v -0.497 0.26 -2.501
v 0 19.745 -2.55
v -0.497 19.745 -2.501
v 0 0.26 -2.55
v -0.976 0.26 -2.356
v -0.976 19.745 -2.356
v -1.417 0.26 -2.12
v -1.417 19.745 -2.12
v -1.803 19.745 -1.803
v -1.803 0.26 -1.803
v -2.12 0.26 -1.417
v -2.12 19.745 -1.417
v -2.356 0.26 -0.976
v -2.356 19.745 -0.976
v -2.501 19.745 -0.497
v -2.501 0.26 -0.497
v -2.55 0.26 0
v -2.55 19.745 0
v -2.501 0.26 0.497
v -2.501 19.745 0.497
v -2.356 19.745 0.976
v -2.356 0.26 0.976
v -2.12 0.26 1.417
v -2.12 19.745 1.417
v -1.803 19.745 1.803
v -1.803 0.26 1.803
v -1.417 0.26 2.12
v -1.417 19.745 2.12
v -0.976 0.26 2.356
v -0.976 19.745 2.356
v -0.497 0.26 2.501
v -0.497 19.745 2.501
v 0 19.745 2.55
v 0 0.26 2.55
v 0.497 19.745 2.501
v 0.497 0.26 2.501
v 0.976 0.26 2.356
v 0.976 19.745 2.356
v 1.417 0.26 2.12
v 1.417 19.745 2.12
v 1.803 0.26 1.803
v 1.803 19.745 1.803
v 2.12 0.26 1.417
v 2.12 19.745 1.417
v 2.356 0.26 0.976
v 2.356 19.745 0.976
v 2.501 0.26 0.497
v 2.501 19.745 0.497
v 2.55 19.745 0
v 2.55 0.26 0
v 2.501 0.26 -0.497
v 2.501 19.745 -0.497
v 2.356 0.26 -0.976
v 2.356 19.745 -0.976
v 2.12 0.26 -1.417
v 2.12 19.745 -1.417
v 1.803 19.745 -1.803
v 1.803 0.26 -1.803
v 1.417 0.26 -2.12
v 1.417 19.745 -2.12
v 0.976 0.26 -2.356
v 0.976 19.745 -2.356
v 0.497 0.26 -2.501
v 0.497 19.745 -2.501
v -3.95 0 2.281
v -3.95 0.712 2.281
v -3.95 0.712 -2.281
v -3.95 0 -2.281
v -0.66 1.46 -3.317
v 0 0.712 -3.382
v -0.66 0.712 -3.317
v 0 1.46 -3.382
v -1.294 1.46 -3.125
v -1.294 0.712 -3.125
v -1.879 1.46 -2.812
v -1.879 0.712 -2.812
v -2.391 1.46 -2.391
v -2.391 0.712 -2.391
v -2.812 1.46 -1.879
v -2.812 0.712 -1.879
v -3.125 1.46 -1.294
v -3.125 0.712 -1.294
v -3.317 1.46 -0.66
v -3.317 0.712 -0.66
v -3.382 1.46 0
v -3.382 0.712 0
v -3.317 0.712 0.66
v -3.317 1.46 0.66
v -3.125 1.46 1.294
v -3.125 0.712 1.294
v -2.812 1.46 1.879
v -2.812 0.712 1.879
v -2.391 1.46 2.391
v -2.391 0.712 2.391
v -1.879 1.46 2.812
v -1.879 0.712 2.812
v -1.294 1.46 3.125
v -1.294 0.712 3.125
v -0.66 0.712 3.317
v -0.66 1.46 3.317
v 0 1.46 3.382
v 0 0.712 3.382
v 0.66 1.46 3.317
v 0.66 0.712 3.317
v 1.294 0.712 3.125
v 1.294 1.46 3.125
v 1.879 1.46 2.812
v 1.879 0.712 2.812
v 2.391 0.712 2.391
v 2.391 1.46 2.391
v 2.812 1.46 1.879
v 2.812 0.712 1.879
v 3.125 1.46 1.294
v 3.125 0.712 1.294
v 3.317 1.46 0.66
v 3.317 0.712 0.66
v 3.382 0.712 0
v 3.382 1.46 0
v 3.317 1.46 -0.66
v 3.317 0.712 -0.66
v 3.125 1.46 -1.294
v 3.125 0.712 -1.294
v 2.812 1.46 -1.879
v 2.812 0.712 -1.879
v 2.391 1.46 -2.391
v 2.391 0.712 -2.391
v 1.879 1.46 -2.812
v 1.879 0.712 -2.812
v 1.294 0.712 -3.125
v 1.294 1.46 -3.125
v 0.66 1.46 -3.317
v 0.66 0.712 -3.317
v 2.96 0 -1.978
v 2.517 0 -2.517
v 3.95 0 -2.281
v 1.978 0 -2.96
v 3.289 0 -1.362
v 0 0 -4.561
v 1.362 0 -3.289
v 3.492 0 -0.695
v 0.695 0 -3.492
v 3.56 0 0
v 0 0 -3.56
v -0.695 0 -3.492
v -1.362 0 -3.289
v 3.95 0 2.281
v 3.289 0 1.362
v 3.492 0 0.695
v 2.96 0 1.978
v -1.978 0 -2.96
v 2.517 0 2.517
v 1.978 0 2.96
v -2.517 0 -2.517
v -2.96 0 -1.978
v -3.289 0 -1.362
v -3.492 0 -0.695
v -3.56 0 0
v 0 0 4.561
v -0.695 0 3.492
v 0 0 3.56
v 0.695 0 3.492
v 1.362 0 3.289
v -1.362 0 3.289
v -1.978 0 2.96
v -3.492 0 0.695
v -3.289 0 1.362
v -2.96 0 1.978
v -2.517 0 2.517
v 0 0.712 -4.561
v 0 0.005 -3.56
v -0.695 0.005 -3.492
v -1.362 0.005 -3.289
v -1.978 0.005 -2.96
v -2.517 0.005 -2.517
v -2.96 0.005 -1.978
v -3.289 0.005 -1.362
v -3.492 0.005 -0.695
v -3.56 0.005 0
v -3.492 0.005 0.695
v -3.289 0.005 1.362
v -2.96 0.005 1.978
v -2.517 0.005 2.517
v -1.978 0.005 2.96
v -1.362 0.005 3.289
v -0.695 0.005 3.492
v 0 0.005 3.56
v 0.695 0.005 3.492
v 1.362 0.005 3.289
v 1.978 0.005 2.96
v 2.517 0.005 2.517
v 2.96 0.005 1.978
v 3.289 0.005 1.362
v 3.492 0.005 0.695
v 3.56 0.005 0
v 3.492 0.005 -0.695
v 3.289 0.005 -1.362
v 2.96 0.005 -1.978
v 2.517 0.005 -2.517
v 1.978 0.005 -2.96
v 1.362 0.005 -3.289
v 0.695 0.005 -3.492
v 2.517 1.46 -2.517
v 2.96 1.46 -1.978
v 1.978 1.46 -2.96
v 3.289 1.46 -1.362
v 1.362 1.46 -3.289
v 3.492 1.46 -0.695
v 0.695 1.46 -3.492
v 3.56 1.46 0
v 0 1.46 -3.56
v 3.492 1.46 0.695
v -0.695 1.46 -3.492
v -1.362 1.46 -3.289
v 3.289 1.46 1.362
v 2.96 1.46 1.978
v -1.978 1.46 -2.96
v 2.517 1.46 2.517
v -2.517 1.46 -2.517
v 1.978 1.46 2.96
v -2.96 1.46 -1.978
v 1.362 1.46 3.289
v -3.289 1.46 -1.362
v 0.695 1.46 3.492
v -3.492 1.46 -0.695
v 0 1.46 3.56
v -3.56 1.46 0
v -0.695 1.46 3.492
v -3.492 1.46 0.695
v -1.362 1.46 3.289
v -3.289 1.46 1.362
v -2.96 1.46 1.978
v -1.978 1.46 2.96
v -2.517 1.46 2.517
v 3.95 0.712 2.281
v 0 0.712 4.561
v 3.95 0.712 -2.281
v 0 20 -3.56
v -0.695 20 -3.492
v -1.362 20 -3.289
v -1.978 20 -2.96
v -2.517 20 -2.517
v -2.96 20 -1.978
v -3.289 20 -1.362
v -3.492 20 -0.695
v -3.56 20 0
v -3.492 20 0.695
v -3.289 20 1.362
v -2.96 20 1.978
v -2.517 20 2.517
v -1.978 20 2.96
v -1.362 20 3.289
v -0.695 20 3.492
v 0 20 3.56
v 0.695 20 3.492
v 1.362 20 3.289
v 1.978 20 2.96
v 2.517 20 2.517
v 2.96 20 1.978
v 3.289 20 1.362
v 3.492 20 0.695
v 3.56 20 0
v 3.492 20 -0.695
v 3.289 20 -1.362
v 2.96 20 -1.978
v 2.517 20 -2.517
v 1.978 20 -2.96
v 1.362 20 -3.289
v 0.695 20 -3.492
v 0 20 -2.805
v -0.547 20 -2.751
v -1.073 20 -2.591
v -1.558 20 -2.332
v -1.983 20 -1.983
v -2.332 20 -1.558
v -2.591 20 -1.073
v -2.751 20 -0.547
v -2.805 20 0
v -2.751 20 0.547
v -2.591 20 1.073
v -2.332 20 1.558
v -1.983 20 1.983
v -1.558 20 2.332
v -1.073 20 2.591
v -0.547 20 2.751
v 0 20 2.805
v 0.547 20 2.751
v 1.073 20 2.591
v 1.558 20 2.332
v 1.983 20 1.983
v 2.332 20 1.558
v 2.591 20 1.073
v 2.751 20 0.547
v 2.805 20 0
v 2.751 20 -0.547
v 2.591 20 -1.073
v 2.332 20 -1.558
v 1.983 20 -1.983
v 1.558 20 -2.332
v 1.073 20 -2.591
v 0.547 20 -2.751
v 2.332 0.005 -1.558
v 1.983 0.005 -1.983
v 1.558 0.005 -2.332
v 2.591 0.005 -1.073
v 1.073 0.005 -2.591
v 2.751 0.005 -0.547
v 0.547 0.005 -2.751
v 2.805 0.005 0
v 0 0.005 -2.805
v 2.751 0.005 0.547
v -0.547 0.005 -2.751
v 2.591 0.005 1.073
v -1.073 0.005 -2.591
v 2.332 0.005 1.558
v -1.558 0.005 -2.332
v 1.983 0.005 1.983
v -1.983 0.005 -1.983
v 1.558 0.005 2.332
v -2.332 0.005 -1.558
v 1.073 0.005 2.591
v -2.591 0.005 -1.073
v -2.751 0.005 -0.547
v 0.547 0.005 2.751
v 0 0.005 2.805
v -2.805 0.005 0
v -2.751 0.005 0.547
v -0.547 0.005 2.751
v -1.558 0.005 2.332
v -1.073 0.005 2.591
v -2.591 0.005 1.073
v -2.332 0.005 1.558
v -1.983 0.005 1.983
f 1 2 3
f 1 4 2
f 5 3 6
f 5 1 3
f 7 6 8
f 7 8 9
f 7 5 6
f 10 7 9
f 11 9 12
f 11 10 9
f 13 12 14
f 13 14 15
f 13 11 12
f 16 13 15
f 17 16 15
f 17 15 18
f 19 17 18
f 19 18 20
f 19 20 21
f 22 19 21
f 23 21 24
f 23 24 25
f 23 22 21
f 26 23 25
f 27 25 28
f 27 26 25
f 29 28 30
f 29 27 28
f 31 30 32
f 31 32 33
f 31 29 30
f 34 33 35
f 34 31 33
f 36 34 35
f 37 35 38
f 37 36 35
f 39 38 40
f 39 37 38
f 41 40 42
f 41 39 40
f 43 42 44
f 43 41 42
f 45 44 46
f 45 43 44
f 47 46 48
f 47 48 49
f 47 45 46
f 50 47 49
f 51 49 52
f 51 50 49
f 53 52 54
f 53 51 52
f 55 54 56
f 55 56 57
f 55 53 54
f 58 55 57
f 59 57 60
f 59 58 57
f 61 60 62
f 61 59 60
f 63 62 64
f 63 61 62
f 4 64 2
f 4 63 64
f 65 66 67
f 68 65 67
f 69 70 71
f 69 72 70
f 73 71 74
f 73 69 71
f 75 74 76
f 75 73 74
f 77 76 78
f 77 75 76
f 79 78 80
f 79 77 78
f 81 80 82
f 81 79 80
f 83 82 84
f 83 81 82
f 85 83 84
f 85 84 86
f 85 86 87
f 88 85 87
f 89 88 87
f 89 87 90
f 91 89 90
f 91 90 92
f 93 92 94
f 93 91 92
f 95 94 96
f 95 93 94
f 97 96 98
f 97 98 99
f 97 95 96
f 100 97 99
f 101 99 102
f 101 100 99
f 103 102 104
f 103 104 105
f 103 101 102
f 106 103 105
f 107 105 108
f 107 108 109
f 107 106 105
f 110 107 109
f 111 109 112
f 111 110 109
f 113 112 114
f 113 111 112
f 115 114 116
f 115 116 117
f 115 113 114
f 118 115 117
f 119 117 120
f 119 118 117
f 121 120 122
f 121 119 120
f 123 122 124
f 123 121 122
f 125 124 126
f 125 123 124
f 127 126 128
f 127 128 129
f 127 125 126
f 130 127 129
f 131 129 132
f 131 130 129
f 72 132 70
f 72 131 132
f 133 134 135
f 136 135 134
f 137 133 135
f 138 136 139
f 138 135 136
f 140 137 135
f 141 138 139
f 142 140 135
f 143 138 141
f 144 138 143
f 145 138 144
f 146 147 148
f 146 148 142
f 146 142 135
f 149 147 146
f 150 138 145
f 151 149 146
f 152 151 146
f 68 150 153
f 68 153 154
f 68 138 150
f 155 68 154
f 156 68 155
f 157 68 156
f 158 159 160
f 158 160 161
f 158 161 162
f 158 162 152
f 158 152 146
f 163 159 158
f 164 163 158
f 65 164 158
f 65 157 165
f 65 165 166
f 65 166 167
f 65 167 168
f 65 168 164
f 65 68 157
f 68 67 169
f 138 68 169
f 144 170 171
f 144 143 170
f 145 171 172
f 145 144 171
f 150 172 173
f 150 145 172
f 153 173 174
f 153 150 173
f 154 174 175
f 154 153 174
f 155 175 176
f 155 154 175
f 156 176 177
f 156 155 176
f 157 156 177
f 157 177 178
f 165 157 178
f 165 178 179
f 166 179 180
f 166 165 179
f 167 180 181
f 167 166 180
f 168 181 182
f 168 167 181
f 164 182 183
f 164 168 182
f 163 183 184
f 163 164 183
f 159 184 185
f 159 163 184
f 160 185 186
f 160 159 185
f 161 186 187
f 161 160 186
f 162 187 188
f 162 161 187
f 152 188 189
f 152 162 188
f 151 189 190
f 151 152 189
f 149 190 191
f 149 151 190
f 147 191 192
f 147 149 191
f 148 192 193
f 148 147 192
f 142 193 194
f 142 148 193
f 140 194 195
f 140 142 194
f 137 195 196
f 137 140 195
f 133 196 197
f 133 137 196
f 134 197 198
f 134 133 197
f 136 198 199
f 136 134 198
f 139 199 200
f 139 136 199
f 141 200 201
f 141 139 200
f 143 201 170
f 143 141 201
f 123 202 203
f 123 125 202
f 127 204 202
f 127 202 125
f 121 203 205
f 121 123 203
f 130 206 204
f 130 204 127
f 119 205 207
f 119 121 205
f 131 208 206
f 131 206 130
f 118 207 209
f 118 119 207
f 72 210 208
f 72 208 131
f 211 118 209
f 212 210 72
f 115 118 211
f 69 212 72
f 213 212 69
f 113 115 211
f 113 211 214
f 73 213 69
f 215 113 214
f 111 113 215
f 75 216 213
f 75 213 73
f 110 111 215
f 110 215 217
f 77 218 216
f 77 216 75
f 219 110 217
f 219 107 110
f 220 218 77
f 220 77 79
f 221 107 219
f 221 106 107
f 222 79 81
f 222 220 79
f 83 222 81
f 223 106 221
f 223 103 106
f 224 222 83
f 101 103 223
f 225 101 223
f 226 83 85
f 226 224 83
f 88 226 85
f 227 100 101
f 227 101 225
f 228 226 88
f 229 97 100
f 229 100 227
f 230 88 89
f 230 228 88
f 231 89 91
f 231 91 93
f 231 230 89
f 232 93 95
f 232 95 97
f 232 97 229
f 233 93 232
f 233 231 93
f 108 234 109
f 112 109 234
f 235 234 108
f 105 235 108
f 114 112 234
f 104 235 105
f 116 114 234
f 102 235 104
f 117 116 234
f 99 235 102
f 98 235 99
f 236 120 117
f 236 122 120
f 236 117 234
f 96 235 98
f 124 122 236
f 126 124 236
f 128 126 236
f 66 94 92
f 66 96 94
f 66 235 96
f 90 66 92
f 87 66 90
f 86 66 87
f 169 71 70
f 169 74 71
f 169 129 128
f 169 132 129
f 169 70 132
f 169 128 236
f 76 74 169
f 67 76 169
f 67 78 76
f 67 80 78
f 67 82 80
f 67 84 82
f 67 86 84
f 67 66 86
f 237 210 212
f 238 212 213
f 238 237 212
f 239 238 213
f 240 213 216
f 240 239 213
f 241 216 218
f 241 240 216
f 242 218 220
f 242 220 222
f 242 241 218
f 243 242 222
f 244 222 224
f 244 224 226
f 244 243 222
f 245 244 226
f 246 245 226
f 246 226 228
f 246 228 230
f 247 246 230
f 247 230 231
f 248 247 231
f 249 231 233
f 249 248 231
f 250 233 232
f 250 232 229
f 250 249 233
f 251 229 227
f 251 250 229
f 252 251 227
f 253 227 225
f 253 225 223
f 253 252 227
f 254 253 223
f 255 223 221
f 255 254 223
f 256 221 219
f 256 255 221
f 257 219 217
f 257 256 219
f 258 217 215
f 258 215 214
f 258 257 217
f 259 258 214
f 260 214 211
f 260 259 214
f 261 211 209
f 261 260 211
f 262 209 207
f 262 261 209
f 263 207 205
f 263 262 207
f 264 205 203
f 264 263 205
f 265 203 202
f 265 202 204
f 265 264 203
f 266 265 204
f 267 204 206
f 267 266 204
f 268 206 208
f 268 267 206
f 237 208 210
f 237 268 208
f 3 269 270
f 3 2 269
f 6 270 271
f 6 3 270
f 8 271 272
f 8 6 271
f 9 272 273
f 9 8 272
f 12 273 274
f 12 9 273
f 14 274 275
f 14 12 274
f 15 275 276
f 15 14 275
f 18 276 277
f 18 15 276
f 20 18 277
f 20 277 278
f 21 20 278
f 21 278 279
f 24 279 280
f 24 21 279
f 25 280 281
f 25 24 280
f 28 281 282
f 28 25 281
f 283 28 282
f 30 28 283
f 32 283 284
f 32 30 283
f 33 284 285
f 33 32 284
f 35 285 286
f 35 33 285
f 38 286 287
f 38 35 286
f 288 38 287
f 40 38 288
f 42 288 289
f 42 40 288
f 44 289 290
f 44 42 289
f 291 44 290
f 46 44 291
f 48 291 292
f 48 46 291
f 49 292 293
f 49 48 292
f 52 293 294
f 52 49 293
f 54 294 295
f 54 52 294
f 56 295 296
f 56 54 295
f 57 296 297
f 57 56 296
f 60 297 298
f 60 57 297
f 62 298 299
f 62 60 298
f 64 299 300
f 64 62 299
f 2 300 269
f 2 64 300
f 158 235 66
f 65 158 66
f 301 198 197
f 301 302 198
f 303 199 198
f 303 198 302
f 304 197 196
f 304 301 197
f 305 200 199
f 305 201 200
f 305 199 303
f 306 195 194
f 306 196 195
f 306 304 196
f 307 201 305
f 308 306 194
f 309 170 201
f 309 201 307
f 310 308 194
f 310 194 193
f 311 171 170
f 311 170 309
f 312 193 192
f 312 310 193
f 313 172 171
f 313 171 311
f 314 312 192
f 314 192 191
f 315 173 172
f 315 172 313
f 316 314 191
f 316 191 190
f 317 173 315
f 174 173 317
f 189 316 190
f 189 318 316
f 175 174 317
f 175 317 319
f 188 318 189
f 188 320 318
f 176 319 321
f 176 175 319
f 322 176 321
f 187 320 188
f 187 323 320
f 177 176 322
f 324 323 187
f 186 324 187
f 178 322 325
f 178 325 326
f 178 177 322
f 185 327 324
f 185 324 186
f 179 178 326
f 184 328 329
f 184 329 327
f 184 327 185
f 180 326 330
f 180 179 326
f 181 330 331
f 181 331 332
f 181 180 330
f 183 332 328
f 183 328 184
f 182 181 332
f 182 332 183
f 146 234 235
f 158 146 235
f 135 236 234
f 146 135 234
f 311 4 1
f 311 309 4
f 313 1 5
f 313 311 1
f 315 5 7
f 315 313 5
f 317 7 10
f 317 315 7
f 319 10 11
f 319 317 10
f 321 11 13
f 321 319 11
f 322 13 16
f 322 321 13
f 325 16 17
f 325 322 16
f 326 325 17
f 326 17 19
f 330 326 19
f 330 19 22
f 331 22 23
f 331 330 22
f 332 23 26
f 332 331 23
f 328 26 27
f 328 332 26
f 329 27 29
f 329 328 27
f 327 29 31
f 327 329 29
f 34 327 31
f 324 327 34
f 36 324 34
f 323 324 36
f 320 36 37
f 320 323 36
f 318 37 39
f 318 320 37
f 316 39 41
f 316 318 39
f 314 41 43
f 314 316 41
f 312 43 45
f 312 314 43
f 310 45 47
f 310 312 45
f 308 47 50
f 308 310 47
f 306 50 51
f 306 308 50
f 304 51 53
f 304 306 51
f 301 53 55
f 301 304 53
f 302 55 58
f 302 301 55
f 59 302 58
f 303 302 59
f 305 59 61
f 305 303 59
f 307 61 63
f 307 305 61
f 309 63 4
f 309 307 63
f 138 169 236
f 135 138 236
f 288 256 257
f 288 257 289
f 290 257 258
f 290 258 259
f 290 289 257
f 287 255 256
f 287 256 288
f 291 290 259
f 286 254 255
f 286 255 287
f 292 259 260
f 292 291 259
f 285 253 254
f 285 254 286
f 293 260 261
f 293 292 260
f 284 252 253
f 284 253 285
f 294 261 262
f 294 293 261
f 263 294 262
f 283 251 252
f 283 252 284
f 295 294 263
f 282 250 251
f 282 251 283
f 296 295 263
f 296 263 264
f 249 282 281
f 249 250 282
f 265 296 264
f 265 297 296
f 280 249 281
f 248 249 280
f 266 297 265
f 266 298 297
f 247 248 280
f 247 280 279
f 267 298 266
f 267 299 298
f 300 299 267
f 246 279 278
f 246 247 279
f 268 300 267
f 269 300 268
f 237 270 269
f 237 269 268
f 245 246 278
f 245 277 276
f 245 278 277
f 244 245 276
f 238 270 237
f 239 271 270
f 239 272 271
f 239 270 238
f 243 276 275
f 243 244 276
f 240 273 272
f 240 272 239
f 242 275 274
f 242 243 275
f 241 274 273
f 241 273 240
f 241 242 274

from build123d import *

# Parameters (mm, degrees)
HEXDIESKE_R  = 4.5825
HEXDIE_DEPTH = 0.712


with BuildPart() as part:
    # BodySke → Body (revolve)
    with BuildSketch(Plane.XY, mode=Mode.PRIVATE) as body_sk:
        Polygon((3.56, 0), (4.582, 0), (4.582, 0.712), (3.382, 0.712), (3.382, 1.4596), (3.56, 1.4596), (3.56, 20), (2.805, 20), (2.55, 19.745), (2.55, 0.26008), (2.805, 0.00508), (3.56, 0.00508), align=None)
    revolve(body_sk.sketch.rotate(Axis((0, 0, 0), (0, 1, 0)), 90), axis=Axis((0, 0, 0), (0, 1, 0)))

    # HexDieSke → HexDie (cut)
    with BuildSketch(Plane(origin=(0, 0.712, 0), x_dir=(-1, 0, 0), z_dir=(0, 1, 0))):
        Circle(HEXDIESKE_R)
        Polygon((0, 4.561067127), (3.95, 2.280533563), (3.95, -2.280533563), (0, -4.561067127), (-3.95, -2.280533563), (-3.95, 2.280533563), align=None, mode=Mode.SUBTRACT)
    extrude(amount=-HEXDIE_DEPTH, mode=Mode.SUBTRACT)


solid = part.part
